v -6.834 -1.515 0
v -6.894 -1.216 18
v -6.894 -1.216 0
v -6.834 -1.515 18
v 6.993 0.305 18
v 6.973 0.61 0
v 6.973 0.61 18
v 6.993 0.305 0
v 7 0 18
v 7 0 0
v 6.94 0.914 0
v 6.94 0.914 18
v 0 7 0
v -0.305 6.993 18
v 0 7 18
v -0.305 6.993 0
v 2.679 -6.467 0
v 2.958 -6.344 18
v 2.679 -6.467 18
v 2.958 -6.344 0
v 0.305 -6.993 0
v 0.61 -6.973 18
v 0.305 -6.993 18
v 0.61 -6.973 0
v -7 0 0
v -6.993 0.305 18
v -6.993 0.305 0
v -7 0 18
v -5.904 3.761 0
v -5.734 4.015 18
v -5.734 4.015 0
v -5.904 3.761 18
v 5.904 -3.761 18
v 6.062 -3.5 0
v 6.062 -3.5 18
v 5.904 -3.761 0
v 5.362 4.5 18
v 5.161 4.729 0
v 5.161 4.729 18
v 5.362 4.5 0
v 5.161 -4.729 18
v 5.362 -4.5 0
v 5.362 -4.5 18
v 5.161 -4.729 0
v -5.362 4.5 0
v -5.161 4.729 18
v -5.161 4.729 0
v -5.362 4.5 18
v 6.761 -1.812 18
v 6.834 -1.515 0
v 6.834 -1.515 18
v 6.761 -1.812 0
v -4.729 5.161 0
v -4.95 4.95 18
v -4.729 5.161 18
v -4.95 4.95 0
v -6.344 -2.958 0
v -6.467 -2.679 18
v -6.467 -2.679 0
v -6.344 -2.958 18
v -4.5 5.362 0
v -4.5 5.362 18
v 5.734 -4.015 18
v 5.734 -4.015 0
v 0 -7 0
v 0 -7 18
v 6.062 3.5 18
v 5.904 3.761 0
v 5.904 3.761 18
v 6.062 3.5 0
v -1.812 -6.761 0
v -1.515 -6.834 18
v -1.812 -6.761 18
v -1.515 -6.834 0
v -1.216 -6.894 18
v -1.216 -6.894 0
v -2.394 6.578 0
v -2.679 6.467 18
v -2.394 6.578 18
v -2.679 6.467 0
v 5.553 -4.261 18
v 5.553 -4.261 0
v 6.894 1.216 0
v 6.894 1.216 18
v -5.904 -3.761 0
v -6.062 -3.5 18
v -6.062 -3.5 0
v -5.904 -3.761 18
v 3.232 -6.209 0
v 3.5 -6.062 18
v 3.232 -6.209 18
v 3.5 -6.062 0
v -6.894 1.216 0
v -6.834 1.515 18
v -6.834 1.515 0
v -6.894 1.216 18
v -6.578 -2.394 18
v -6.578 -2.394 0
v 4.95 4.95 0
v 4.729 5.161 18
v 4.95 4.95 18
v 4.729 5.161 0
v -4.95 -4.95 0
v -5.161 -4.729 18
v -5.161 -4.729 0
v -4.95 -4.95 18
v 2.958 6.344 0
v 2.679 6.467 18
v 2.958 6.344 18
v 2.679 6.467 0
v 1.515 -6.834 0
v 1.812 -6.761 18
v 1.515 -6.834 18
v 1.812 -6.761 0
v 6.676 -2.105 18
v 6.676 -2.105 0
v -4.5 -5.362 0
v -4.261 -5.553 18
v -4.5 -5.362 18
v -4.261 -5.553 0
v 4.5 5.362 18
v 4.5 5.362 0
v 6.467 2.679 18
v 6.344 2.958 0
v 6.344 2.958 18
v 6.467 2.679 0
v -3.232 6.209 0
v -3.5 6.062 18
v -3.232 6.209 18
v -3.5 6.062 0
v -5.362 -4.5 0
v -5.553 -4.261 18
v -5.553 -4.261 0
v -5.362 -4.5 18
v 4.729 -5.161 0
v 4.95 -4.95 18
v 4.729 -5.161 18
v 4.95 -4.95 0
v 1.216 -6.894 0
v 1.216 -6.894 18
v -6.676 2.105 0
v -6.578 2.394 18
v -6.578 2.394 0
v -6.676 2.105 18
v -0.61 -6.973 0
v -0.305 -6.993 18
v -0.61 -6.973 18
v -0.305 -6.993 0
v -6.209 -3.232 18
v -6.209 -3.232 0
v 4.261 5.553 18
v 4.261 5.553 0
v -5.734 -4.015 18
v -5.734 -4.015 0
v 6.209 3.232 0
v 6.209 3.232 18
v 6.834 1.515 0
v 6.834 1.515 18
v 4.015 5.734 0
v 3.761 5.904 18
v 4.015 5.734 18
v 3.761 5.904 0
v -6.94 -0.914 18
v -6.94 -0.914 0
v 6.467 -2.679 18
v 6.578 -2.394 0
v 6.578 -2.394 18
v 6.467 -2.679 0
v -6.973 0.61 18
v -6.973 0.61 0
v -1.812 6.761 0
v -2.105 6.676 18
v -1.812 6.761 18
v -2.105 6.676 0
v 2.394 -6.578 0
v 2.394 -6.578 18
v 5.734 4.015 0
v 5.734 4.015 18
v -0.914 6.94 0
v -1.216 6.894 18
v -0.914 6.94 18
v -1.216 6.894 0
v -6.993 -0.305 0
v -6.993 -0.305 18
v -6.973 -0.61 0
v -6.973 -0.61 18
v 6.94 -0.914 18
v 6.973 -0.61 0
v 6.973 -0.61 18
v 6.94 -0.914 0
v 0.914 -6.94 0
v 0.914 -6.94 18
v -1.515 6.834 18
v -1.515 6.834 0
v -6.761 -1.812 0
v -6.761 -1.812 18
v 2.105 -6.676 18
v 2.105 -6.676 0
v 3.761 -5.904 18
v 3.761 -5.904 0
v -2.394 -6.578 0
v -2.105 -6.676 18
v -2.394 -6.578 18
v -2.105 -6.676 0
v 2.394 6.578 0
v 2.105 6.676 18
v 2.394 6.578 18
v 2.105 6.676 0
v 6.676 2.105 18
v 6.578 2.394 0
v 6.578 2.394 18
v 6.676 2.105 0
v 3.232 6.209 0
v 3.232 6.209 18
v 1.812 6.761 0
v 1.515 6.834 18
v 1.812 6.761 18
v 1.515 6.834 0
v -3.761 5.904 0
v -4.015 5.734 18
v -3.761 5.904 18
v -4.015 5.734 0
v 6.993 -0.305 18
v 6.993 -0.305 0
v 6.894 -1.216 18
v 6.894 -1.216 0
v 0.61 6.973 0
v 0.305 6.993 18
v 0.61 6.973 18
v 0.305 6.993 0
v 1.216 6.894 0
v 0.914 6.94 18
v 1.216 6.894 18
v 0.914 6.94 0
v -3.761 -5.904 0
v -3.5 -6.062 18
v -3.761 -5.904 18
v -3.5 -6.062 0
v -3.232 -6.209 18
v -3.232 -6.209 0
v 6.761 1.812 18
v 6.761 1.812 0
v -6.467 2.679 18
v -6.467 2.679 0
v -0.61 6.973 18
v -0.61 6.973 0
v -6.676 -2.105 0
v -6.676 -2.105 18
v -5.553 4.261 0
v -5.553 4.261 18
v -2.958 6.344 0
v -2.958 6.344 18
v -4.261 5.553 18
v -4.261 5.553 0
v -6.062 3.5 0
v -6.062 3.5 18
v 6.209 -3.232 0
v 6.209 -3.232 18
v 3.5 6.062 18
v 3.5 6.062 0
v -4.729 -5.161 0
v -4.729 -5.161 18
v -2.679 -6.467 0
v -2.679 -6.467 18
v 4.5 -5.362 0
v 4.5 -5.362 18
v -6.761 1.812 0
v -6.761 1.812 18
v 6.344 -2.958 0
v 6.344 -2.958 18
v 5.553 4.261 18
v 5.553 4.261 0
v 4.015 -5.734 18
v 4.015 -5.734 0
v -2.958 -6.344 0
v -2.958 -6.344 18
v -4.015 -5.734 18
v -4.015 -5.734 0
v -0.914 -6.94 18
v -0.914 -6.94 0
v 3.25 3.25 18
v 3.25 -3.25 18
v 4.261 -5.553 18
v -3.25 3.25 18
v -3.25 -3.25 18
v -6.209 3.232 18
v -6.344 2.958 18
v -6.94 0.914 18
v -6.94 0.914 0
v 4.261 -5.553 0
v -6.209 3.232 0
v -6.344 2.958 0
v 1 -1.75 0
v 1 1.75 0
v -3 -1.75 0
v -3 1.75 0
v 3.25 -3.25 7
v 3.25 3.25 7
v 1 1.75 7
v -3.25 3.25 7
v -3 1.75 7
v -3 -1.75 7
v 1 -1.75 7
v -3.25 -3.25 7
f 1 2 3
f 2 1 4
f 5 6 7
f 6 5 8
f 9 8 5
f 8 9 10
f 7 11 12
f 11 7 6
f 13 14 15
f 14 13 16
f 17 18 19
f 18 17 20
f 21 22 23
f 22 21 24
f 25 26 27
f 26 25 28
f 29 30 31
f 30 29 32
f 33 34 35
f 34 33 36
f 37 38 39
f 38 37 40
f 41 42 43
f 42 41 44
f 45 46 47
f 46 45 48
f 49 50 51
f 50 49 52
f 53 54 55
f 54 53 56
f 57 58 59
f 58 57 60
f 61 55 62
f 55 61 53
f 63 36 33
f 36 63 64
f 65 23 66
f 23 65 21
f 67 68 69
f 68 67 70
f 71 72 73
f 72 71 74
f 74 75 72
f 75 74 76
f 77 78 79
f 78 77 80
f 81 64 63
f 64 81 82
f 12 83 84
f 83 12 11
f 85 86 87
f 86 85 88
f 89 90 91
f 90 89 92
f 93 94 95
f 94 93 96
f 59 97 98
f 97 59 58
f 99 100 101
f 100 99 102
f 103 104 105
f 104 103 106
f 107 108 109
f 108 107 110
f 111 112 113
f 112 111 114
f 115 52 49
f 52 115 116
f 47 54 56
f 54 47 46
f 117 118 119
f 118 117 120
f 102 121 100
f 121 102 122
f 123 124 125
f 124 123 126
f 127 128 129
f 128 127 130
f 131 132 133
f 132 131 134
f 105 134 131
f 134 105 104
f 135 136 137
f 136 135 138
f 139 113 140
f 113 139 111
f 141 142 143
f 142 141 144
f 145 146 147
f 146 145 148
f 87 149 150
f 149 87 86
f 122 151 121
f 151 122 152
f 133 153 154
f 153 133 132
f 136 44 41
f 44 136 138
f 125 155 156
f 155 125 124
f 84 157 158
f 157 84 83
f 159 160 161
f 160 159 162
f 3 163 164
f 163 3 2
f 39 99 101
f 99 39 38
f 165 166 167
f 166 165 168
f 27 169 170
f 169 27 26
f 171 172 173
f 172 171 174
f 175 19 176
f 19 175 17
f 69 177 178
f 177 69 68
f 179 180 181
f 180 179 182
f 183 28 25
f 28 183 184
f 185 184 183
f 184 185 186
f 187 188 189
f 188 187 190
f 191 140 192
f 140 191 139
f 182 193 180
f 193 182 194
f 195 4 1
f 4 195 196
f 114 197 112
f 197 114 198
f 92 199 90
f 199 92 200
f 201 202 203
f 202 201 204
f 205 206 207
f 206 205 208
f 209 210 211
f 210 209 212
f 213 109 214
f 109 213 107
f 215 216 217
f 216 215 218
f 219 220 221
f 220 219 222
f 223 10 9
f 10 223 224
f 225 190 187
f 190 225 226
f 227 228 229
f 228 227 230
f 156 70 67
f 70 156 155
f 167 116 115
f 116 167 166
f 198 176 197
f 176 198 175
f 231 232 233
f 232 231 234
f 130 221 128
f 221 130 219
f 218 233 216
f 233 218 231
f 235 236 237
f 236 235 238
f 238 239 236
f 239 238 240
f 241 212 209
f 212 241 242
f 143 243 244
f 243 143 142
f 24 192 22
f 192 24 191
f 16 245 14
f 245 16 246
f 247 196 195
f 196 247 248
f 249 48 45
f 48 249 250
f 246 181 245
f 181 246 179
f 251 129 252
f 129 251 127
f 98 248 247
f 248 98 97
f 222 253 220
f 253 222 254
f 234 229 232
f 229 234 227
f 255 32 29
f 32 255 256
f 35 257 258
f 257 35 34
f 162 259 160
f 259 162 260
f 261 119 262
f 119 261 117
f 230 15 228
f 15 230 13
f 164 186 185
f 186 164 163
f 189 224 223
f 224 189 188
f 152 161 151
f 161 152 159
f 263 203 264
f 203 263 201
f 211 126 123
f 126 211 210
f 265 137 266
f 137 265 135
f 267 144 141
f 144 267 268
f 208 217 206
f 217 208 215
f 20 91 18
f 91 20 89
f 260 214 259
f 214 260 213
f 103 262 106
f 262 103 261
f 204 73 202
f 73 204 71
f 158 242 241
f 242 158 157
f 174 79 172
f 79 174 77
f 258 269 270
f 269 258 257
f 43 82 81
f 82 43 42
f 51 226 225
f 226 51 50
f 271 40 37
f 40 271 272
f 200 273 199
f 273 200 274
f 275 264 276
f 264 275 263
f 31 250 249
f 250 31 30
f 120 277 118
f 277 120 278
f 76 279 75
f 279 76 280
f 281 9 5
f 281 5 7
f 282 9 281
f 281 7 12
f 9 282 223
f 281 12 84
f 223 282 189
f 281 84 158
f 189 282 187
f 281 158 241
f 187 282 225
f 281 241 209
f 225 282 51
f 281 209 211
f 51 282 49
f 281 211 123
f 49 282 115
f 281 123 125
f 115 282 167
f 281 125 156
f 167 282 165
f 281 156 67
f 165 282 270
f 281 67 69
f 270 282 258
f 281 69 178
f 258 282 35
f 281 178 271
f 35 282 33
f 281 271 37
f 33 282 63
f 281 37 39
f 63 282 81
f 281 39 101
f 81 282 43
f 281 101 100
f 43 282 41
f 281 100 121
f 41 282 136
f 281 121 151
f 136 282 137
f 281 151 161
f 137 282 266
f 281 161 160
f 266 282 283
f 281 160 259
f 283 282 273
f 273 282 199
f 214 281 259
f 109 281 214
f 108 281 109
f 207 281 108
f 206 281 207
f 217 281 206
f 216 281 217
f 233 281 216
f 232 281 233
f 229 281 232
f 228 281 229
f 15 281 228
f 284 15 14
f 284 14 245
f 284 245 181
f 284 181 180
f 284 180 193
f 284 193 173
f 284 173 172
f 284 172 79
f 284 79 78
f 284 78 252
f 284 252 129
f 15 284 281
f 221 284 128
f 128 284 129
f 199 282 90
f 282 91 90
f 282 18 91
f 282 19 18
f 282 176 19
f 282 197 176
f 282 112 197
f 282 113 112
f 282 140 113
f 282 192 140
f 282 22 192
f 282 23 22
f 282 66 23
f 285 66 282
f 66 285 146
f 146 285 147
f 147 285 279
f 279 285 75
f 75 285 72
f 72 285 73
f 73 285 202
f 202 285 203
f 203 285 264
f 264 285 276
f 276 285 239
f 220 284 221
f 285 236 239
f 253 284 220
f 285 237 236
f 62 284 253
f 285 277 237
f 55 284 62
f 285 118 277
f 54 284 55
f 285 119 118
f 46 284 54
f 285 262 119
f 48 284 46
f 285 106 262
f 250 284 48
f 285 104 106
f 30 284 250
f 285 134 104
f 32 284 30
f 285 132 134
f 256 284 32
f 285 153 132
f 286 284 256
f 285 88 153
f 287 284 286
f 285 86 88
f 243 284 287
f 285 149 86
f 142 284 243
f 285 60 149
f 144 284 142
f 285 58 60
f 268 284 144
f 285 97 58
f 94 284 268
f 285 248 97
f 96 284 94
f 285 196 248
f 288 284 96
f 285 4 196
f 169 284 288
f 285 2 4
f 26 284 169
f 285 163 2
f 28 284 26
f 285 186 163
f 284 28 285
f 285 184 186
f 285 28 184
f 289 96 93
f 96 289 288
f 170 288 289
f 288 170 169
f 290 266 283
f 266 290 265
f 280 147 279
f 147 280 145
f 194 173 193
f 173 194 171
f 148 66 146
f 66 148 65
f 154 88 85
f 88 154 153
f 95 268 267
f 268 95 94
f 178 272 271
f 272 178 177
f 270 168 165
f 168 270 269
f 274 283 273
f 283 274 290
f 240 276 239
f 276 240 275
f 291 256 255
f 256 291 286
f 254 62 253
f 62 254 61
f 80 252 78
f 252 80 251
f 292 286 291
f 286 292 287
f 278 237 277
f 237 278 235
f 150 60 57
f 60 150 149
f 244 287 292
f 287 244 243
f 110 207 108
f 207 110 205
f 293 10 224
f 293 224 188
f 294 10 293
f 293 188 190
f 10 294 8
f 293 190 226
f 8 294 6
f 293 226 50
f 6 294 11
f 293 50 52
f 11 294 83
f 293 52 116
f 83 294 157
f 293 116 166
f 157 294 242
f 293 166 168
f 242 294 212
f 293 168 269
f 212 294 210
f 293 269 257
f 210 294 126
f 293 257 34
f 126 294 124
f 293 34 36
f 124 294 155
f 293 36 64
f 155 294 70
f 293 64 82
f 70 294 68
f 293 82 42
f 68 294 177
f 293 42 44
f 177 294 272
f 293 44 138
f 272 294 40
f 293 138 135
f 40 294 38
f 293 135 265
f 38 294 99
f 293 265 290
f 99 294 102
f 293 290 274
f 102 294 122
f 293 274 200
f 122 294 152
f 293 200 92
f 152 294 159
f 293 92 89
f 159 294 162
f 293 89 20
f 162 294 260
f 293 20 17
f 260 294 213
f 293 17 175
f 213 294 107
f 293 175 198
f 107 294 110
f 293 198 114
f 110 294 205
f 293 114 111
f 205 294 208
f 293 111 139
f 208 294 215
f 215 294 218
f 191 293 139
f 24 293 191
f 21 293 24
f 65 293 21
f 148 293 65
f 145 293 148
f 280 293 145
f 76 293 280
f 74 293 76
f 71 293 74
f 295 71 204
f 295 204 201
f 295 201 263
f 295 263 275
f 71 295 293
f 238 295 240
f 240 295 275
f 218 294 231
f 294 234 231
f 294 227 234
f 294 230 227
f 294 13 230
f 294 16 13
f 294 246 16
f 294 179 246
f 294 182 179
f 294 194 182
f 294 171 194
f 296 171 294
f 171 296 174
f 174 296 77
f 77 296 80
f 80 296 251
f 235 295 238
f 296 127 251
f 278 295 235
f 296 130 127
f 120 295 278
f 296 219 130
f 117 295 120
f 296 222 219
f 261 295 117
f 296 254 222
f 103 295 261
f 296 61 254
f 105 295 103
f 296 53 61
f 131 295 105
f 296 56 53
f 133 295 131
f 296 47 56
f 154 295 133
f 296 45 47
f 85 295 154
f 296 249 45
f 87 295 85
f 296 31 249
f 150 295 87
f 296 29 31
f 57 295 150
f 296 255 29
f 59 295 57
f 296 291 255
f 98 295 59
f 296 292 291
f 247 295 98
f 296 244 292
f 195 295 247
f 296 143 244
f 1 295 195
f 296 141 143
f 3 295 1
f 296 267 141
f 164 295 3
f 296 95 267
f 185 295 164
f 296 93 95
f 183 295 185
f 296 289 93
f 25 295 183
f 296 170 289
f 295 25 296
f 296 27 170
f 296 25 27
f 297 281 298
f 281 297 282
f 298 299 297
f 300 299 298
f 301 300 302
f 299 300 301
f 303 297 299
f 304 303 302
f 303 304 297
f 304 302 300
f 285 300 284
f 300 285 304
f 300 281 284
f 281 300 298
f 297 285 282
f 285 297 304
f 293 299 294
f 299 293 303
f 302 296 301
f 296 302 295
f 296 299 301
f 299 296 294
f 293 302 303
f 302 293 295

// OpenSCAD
use <MCAD/regular_shapes.scad>

$fn=144;

shaft_diameter = 6.5;

difference() {
    cylinder(18, 7, 7);
    
    //Blinds shaft
    translate([-shaft_diameter/2, -shaft_diameter/2, 7])
        cube([shaft_diameter, shaft_diameter, 11]);
    
    // Motor shaft
    translate([-6/2, -3.5/2, 0])
        cube([4, 3.5, 7]);
};
